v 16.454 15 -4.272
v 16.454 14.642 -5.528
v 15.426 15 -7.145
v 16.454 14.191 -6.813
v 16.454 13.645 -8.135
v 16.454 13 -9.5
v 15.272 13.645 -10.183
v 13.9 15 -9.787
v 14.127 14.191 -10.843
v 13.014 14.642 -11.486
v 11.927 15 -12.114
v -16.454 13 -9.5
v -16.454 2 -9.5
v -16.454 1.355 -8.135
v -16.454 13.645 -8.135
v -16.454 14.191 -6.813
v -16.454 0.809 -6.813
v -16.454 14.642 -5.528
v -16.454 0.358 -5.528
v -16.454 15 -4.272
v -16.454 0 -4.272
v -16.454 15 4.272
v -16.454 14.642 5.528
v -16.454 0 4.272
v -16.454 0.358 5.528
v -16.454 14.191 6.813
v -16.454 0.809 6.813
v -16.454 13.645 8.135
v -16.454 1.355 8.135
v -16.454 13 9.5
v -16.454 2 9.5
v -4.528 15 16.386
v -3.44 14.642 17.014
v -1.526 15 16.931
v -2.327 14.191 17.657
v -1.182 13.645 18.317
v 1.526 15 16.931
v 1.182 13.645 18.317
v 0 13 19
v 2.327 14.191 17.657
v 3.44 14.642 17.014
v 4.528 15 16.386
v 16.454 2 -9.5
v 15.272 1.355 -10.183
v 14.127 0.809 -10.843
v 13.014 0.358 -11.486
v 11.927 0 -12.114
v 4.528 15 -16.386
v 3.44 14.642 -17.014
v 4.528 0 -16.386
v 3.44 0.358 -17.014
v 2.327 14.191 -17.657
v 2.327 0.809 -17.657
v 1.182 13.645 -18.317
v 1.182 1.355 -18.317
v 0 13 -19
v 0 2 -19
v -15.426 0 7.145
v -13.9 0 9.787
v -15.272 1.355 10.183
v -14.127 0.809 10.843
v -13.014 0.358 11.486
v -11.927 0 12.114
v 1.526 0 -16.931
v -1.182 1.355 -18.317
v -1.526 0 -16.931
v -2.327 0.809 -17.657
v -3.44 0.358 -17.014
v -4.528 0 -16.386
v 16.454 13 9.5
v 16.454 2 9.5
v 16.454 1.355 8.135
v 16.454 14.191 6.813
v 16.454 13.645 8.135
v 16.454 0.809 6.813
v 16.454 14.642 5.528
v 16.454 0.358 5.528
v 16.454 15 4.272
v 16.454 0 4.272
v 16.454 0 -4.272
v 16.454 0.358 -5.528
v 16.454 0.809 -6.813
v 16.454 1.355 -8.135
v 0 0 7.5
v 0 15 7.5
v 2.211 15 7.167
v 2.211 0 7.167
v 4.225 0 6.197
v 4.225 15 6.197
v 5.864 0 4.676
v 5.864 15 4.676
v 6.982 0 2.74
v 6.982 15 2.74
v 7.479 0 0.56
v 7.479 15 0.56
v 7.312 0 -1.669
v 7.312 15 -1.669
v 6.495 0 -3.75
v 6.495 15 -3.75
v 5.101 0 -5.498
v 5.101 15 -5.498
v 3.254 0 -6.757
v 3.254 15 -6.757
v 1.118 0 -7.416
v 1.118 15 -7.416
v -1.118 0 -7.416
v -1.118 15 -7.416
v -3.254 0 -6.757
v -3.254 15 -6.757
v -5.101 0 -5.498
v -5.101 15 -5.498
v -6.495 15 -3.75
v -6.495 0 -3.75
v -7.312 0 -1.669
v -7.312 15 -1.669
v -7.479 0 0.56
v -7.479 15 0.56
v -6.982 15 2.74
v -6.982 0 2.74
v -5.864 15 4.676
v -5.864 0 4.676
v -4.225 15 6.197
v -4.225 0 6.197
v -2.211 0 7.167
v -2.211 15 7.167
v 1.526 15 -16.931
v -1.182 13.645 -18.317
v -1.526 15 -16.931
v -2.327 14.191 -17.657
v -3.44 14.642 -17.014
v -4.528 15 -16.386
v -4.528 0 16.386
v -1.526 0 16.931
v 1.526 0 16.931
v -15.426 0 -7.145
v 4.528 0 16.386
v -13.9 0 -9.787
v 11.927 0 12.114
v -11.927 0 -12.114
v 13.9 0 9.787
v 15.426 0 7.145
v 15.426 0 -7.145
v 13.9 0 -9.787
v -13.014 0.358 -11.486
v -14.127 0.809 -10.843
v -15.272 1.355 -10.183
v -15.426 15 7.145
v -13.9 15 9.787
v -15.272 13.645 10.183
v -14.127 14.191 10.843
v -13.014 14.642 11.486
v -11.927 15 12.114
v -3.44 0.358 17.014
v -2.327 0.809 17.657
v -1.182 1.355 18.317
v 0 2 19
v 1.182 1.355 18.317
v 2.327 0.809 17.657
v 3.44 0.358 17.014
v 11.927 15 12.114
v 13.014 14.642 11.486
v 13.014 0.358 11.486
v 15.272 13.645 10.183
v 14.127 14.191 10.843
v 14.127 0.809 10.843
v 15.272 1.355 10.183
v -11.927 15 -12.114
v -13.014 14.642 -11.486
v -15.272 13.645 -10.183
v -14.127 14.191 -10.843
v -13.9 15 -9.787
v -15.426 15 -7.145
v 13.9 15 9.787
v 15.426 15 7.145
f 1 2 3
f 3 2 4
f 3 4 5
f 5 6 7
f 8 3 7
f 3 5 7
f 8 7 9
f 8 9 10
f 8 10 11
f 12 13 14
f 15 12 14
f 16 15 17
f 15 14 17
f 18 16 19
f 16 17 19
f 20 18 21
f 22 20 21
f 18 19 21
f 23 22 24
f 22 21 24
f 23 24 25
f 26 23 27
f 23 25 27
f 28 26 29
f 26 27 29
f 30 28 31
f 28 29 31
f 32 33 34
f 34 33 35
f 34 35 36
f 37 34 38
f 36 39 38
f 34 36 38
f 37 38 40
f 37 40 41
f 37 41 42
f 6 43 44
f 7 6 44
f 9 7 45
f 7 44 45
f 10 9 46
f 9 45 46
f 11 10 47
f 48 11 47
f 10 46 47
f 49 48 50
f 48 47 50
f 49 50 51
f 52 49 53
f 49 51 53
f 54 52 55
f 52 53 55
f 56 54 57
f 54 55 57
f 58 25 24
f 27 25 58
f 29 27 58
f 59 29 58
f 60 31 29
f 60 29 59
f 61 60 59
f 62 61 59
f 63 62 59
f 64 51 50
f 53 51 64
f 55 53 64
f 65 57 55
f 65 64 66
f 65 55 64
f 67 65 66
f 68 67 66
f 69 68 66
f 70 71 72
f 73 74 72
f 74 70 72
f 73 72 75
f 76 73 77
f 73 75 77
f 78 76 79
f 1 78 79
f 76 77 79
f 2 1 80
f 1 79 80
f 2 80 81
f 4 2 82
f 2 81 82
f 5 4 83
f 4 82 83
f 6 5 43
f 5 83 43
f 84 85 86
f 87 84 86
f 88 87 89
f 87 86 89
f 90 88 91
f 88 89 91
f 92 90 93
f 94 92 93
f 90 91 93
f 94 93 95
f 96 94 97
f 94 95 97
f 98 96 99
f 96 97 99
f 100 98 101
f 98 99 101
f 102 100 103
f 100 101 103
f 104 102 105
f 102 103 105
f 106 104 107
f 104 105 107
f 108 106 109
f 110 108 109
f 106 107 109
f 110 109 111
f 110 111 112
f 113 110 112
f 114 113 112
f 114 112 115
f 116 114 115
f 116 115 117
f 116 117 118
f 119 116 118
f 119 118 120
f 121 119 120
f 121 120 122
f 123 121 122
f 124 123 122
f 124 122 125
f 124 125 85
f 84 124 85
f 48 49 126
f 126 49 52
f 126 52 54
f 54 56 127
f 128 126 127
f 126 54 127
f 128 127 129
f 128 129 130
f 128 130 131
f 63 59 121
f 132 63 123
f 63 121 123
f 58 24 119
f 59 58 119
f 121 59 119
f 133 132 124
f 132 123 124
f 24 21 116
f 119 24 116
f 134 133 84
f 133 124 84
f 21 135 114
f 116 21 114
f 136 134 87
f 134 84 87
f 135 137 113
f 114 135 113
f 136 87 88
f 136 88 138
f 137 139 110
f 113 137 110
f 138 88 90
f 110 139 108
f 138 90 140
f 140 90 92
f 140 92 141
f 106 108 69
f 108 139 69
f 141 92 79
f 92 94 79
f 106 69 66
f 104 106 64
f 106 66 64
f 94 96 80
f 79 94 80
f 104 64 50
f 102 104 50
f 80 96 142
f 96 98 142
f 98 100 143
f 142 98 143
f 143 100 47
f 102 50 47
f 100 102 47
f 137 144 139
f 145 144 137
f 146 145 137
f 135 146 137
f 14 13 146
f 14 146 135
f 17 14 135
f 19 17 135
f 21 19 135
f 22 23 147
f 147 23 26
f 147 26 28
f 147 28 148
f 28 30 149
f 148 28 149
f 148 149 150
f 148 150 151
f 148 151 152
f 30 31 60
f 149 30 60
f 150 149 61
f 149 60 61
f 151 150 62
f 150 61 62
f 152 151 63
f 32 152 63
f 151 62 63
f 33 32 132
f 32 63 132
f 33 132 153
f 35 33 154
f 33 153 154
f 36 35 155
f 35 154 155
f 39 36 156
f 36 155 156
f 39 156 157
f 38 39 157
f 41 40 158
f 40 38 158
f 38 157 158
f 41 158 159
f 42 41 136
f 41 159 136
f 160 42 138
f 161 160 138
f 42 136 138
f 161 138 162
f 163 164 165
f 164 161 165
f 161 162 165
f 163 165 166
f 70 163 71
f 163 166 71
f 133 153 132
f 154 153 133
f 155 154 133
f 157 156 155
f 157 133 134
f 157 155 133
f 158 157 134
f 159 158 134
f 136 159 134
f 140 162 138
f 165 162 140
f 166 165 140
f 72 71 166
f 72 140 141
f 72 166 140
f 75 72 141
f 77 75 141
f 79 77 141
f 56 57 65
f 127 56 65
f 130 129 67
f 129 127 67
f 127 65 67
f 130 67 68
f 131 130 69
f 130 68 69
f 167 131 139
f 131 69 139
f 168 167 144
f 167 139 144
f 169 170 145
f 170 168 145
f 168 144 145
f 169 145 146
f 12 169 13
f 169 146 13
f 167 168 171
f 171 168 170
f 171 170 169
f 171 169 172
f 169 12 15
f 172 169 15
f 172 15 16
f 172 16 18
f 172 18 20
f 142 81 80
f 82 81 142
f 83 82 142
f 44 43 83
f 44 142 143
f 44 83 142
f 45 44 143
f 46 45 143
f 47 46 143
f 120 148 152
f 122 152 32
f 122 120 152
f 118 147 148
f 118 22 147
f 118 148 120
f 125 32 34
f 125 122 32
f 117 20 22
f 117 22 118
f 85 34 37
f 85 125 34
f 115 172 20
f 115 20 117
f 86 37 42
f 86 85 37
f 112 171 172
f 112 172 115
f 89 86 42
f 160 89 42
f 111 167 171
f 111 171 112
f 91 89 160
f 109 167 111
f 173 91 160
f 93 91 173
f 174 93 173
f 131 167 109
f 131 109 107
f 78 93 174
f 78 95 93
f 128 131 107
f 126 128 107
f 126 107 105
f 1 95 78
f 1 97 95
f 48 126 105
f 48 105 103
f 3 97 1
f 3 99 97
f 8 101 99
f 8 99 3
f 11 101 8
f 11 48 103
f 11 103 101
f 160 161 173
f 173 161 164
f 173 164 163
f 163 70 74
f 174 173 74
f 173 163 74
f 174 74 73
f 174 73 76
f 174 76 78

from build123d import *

# Parameters (mm, degrees)
BOSS_EXTRUDE1_DEPTH = 15
SKETCH4_R           = 7.5
CUT_EXTRUDE1_DEPTH  = 30.270292107


with BuildPart() as part:
    # Sketch3 → Boss-Extrude1 (new body)
    with BuildSketch(Plane(origin=(0, 0, 0), x_dir=(1, 0, 0), z_dir=(0, 1, 0))):
        Polygon((0, -19), (16.454482672, -9.5), (16.454482672, 9.5), (0, 19), (-16.454482672, 9.5), (-16.454482672, -9.5), align=None)
    extrude(amount=BOSS_EXTRUDE1_DEPTH)

    # Sketch4 → Cut-Extrude1 (cut, through all)
    with BuildSketch(Plane(origin=(0, 15, 0), x_dir=(1, 0, 0), z_dir=(0, 1, 0))):
        with Locations(Location((0, 0, 0), (0, 0, 270))):
            Circle(SKETCH4_R)
    extrude(amount=-CUT_EXTRUDE1_DEPTH, mode=Mode.SUBTRACT)

    # Sketch6 → Cut-Revolve1 (revolve, cut)
    with BuildSketch(Plane(origin=(0, 0, 0), x_dir=(0, 0, -1), z_dir=(1, 0, 0))):
        Polygon((16.222397812, 15.777602188), (21.222397812, 10.777602188), (21.222397812, 15.777602188), align=None)
    revolve(axis=Axis((0, 0, 0), (0, 1, 0)), mode=Mode.SUBTRACT)

    # Sketch8 → Cut-Revolve2 (revolve, cut)
    with BuildSketch(Plane(origin=(0, 0, 0), x_dir=(0, 0, -1), z_dir=(1, 0, 0))):
        Polygon((16.303352357, -0.696647643), (21.303352357, 4.303352357), (21.303352357, -0.696647643), align=None)
    revolve(axis=Axis((0, 0, 0), (0, 1, 0)), mode=Mode.SUBTRACT)


solid = part.part
